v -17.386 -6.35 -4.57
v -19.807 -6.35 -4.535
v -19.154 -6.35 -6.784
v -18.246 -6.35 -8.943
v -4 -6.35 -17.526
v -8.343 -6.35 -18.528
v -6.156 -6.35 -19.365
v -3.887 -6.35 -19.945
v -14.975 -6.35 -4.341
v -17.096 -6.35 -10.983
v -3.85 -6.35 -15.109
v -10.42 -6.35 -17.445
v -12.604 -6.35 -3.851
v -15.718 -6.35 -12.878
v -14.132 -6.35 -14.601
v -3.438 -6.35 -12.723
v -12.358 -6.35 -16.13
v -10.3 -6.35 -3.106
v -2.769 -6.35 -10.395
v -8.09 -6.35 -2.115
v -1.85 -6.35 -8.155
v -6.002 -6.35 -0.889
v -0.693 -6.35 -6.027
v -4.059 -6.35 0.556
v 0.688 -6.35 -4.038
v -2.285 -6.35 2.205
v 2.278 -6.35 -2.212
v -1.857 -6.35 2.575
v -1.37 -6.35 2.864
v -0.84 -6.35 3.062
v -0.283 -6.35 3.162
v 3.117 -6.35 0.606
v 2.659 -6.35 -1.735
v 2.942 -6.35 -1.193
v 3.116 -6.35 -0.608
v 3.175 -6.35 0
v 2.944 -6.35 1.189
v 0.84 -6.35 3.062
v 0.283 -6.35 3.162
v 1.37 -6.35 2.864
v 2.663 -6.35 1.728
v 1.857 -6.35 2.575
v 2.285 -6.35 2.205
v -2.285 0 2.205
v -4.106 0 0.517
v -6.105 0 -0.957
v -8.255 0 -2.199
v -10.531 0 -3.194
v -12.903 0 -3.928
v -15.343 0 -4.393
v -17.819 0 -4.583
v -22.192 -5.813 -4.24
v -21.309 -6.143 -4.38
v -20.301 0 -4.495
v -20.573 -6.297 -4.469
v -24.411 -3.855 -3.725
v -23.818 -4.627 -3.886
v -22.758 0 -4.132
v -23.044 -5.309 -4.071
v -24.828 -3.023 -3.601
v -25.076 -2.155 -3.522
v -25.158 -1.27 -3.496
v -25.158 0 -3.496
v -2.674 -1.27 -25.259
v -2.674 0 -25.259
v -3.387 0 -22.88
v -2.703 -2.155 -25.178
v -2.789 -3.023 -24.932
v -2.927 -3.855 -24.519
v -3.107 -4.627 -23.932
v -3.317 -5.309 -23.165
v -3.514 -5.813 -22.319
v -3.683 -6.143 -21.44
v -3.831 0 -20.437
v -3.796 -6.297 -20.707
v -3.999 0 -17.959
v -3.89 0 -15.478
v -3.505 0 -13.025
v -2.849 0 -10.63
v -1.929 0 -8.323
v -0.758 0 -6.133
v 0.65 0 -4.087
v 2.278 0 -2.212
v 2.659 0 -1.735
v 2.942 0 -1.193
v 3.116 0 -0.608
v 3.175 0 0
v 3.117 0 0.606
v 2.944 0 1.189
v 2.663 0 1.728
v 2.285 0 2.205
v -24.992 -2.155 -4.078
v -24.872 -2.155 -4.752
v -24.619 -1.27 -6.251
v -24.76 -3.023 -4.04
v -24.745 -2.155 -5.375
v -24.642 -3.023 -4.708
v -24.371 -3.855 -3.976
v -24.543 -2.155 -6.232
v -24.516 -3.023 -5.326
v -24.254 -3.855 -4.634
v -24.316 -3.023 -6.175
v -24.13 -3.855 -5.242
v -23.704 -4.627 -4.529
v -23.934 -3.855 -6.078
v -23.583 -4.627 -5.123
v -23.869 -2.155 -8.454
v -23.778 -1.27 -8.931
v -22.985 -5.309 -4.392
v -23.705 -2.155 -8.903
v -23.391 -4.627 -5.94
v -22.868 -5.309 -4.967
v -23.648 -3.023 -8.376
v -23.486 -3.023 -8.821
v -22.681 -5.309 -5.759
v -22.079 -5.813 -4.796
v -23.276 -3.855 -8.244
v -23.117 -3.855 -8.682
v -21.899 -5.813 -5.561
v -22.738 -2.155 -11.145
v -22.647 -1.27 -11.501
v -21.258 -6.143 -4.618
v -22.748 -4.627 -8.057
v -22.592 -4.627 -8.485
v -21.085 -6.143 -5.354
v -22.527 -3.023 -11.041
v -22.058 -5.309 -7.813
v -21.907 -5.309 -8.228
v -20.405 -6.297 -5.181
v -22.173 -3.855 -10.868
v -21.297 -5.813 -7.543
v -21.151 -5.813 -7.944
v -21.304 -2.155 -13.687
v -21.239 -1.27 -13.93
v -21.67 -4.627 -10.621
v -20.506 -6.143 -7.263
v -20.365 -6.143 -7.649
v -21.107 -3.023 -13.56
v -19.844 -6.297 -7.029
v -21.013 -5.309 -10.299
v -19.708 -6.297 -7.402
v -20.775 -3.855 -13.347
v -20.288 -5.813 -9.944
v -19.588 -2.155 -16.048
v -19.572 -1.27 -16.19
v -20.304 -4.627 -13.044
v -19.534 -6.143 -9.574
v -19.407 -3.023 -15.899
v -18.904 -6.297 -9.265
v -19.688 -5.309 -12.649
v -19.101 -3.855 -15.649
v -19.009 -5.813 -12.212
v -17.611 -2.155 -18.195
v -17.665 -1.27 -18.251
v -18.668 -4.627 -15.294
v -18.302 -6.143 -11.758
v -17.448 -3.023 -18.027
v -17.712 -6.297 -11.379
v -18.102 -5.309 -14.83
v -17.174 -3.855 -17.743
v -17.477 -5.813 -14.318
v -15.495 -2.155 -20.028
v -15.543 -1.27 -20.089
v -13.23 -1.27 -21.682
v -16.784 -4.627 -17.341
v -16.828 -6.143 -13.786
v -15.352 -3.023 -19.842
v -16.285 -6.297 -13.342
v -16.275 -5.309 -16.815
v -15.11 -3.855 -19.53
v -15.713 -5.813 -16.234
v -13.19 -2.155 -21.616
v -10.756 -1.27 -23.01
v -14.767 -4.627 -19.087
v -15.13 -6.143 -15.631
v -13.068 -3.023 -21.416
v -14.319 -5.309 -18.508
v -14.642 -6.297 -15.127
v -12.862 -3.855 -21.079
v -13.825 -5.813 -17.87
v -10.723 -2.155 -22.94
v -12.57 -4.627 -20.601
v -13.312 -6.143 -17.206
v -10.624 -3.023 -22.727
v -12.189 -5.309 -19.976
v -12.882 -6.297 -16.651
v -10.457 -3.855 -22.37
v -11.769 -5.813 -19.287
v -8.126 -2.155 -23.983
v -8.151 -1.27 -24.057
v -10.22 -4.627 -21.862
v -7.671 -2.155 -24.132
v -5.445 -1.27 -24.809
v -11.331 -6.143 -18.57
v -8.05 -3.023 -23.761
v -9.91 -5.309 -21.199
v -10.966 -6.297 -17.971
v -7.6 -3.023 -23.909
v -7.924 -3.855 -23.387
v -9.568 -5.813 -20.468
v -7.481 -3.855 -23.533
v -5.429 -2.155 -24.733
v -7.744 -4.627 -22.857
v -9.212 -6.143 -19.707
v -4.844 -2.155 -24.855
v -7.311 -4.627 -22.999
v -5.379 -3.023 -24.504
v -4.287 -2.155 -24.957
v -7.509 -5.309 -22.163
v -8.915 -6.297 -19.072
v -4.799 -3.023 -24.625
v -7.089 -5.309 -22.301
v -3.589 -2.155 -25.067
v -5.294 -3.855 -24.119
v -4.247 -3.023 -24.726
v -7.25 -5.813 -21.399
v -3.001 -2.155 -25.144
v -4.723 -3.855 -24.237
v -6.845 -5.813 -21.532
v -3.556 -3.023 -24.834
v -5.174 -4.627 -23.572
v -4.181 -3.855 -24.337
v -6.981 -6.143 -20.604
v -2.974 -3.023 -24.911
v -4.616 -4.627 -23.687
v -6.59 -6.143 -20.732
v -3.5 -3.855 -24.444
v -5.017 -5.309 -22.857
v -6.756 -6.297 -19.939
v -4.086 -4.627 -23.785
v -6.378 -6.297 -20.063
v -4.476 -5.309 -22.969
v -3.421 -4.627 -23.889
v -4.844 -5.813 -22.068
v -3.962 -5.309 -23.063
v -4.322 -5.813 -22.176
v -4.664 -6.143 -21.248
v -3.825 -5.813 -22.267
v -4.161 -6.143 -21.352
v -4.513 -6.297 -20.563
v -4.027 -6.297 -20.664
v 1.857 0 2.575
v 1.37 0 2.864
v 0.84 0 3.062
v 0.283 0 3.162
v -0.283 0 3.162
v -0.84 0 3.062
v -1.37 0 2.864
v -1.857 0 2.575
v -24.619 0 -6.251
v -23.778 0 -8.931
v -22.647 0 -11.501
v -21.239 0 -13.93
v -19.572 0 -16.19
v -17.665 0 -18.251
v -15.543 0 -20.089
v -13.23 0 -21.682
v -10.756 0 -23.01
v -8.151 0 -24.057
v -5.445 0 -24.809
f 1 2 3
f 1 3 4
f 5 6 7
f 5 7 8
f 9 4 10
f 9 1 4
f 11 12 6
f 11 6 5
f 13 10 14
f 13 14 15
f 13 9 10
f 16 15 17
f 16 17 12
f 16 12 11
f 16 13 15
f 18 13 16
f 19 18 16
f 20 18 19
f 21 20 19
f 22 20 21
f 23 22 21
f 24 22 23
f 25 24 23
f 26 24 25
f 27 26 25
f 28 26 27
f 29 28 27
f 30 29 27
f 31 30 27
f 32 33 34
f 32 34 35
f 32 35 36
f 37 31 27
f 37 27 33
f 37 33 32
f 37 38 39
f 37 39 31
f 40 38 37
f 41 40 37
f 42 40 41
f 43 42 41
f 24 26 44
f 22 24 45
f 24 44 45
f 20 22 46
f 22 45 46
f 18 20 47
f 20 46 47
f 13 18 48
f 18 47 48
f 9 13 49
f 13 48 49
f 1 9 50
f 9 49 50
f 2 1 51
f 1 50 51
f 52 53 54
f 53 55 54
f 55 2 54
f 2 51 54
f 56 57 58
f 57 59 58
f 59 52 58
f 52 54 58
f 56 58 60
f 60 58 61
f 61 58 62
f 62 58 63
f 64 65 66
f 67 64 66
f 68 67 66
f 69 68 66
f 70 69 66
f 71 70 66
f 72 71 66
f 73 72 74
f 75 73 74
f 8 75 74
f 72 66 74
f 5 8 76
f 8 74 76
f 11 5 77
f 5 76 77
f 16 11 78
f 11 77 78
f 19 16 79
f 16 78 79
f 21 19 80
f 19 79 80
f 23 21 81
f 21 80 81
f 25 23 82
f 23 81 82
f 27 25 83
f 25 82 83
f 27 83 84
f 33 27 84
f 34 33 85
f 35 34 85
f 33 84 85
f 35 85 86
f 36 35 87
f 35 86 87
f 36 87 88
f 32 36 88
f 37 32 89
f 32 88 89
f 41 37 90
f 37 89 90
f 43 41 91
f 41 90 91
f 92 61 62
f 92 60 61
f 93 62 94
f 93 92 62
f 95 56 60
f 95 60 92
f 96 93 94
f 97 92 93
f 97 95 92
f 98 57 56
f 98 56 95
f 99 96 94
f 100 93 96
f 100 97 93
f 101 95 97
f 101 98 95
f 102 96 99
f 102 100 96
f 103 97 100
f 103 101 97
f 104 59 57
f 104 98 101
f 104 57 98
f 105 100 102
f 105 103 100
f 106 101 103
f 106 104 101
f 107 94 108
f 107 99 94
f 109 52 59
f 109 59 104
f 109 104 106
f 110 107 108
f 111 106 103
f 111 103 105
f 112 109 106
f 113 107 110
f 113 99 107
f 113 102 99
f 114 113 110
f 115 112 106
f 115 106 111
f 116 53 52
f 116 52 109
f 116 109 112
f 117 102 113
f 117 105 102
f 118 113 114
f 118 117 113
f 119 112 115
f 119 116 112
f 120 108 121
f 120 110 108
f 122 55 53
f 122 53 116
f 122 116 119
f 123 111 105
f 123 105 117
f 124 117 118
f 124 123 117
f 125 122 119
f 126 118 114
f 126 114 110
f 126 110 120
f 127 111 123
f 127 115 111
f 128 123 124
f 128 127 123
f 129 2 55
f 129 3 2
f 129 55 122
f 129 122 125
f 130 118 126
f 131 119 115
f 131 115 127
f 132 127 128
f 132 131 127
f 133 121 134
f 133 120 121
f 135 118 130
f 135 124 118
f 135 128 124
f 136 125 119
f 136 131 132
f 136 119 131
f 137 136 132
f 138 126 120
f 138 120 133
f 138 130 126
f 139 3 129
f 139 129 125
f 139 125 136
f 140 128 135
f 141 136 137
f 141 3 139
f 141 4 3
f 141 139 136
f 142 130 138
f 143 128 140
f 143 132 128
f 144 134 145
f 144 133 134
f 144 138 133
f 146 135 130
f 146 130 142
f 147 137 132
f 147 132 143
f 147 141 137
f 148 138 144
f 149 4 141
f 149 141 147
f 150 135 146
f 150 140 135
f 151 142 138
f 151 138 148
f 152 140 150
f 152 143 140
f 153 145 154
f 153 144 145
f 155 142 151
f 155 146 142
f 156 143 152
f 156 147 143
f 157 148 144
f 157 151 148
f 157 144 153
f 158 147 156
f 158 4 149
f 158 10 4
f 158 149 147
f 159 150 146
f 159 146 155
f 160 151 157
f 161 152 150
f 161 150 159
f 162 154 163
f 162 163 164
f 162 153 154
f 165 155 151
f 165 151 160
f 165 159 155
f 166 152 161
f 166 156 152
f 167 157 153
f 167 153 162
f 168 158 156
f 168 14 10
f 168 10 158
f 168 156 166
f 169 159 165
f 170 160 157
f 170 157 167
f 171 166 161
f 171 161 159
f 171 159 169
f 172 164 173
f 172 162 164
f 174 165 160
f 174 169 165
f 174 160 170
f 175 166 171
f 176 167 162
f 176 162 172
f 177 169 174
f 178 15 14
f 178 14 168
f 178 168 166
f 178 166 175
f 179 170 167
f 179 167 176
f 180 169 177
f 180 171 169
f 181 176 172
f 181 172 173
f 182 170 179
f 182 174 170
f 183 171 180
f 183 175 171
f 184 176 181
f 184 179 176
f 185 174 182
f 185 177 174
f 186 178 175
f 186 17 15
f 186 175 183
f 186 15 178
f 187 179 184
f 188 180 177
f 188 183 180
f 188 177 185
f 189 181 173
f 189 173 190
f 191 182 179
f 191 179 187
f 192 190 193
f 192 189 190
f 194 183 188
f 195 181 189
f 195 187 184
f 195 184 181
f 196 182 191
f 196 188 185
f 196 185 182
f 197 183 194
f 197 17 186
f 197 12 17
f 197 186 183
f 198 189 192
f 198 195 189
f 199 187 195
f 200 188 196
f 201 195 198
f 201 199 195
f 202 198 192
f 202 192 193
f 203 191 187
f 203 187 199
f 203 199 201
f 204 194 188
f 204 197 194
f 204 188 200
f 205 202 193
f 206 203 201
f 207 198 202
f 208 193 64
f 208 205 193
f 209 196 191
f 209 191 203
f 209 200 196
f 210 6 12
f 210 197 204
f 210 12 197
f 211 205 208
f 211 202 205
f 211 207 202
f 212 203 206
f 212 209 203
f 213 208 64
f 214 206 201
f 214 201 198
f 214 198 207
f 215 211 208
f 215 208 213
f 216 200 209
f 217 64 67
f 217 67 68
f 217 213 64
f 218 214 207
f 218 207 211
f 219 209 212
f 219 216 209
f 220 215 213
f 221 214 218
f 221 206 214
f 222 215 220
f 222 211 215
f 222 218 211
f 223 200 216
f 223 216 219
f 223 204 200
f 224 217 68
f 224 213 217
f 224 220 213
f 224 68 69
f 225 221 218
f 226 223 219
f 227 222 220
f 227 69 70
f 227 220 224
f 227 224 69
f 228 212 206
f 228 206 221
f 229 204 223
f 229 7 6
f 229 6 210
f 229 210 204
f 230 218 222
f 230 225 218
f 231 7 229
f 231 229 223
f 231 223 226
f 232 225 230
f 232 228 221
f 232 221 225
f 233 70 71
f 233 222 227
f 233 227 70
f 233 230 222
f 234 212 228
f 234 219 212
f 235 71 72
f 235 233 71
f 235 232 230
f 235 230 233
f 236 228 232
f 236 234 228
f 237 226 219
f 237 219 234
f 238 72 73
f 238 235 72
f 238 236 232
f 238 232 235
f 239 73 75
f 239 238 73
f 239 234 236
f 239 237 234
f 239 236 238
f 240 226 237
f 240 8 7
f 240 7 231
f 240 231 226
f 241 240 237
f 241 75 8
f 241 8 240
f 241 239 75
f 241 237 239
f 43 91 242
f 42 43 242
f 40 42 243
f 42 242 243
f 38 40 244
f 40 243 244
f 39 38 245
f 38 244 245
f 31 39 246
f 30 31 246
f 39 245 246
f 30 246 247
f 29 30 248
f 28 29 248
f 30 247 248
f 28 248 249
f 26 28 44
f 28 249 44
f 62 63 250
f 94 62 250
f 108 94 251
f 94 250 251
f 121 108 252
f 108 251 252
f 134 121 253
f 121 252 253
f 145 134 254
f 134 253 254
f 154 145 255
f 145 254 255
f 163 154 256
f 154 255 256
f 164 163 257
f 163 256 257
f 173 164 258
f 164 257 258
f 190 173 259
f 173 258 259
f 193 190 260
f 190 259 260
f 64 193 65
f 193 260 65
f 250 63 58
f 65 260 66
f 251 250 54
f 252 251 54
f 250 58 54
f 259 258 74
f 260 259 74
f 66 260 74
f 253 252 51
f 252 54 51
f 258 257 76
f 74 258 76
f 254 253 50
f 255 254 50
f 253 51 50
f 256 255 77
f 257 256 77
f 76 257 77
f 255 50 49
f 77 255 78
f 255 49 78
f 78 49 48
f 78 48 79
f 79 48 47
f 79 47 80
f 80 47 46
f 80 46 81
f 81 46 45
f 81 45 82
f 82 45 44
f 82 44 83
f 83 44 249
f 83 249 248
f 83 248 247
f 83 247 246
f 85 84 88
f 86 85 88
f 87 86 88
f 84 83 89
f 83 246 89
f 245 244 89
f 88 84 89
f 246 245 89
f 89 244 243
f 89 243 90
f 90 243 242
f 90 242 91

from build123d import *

# Parameters (mm, degrees)
F1_DEPTH = 6.35
F2_R     = 5.08


with BuildPart() as f1:
    # F0 (on Front) → F1 (new body)
    with BuildSketch(Plane.XZ):
        with BuildLine():
            ThreePointArc((-25.1582770203, -3.4958686142), (-17.6652781796, -18.2509711204), (-2.6737065925, -25.2588854279))
            ThreePointArc((-2.6737065925, -25.2588854279), (-3.505224173, -13.0246794199), (2.277990057, -2.2116478698))
            ThreePointArc((2.277990057, -2.2116478698), (-2.2081596575, -2.2813715013), (-2.2847476043, 2.2046662752))
            ThreePointArc((-2.2847476043, 2.2046662752), (-12.90346397, -3.9280392538), (-25.1582770203, -3.4958686142))
        make_face()
        with BuildLine():
            ThreePointArc((-2.2847476043, 2.2046662752), (-2.2081596575, -2.2813715013), (2.277990057, -2.2116478698))
            ThreePointArc((2.277990057, -2.2116478698), (2.942213744, -1.1933160874), (3.175, 0))
            ThreePointArc((3.175, 0), (2.9440362131, 1.1888127589), (2.2847475428, 2.2046663389))
            ThreePointArc((2.2847475428, 2.2046663389), (-4.43e-08, 3.175), (-2.2847476043, 2.2046662752))
        make_face()
    extrude(amount=F1_DEPTH)

    # F2
    f2_edges = [f1.edges().sort_by_distance(p)[0] for p in [
        (-17.665278, -6.35, -18.250971),
    ]]
    fillet(f2_edges, radius=F2_R)


solid = f1.part
